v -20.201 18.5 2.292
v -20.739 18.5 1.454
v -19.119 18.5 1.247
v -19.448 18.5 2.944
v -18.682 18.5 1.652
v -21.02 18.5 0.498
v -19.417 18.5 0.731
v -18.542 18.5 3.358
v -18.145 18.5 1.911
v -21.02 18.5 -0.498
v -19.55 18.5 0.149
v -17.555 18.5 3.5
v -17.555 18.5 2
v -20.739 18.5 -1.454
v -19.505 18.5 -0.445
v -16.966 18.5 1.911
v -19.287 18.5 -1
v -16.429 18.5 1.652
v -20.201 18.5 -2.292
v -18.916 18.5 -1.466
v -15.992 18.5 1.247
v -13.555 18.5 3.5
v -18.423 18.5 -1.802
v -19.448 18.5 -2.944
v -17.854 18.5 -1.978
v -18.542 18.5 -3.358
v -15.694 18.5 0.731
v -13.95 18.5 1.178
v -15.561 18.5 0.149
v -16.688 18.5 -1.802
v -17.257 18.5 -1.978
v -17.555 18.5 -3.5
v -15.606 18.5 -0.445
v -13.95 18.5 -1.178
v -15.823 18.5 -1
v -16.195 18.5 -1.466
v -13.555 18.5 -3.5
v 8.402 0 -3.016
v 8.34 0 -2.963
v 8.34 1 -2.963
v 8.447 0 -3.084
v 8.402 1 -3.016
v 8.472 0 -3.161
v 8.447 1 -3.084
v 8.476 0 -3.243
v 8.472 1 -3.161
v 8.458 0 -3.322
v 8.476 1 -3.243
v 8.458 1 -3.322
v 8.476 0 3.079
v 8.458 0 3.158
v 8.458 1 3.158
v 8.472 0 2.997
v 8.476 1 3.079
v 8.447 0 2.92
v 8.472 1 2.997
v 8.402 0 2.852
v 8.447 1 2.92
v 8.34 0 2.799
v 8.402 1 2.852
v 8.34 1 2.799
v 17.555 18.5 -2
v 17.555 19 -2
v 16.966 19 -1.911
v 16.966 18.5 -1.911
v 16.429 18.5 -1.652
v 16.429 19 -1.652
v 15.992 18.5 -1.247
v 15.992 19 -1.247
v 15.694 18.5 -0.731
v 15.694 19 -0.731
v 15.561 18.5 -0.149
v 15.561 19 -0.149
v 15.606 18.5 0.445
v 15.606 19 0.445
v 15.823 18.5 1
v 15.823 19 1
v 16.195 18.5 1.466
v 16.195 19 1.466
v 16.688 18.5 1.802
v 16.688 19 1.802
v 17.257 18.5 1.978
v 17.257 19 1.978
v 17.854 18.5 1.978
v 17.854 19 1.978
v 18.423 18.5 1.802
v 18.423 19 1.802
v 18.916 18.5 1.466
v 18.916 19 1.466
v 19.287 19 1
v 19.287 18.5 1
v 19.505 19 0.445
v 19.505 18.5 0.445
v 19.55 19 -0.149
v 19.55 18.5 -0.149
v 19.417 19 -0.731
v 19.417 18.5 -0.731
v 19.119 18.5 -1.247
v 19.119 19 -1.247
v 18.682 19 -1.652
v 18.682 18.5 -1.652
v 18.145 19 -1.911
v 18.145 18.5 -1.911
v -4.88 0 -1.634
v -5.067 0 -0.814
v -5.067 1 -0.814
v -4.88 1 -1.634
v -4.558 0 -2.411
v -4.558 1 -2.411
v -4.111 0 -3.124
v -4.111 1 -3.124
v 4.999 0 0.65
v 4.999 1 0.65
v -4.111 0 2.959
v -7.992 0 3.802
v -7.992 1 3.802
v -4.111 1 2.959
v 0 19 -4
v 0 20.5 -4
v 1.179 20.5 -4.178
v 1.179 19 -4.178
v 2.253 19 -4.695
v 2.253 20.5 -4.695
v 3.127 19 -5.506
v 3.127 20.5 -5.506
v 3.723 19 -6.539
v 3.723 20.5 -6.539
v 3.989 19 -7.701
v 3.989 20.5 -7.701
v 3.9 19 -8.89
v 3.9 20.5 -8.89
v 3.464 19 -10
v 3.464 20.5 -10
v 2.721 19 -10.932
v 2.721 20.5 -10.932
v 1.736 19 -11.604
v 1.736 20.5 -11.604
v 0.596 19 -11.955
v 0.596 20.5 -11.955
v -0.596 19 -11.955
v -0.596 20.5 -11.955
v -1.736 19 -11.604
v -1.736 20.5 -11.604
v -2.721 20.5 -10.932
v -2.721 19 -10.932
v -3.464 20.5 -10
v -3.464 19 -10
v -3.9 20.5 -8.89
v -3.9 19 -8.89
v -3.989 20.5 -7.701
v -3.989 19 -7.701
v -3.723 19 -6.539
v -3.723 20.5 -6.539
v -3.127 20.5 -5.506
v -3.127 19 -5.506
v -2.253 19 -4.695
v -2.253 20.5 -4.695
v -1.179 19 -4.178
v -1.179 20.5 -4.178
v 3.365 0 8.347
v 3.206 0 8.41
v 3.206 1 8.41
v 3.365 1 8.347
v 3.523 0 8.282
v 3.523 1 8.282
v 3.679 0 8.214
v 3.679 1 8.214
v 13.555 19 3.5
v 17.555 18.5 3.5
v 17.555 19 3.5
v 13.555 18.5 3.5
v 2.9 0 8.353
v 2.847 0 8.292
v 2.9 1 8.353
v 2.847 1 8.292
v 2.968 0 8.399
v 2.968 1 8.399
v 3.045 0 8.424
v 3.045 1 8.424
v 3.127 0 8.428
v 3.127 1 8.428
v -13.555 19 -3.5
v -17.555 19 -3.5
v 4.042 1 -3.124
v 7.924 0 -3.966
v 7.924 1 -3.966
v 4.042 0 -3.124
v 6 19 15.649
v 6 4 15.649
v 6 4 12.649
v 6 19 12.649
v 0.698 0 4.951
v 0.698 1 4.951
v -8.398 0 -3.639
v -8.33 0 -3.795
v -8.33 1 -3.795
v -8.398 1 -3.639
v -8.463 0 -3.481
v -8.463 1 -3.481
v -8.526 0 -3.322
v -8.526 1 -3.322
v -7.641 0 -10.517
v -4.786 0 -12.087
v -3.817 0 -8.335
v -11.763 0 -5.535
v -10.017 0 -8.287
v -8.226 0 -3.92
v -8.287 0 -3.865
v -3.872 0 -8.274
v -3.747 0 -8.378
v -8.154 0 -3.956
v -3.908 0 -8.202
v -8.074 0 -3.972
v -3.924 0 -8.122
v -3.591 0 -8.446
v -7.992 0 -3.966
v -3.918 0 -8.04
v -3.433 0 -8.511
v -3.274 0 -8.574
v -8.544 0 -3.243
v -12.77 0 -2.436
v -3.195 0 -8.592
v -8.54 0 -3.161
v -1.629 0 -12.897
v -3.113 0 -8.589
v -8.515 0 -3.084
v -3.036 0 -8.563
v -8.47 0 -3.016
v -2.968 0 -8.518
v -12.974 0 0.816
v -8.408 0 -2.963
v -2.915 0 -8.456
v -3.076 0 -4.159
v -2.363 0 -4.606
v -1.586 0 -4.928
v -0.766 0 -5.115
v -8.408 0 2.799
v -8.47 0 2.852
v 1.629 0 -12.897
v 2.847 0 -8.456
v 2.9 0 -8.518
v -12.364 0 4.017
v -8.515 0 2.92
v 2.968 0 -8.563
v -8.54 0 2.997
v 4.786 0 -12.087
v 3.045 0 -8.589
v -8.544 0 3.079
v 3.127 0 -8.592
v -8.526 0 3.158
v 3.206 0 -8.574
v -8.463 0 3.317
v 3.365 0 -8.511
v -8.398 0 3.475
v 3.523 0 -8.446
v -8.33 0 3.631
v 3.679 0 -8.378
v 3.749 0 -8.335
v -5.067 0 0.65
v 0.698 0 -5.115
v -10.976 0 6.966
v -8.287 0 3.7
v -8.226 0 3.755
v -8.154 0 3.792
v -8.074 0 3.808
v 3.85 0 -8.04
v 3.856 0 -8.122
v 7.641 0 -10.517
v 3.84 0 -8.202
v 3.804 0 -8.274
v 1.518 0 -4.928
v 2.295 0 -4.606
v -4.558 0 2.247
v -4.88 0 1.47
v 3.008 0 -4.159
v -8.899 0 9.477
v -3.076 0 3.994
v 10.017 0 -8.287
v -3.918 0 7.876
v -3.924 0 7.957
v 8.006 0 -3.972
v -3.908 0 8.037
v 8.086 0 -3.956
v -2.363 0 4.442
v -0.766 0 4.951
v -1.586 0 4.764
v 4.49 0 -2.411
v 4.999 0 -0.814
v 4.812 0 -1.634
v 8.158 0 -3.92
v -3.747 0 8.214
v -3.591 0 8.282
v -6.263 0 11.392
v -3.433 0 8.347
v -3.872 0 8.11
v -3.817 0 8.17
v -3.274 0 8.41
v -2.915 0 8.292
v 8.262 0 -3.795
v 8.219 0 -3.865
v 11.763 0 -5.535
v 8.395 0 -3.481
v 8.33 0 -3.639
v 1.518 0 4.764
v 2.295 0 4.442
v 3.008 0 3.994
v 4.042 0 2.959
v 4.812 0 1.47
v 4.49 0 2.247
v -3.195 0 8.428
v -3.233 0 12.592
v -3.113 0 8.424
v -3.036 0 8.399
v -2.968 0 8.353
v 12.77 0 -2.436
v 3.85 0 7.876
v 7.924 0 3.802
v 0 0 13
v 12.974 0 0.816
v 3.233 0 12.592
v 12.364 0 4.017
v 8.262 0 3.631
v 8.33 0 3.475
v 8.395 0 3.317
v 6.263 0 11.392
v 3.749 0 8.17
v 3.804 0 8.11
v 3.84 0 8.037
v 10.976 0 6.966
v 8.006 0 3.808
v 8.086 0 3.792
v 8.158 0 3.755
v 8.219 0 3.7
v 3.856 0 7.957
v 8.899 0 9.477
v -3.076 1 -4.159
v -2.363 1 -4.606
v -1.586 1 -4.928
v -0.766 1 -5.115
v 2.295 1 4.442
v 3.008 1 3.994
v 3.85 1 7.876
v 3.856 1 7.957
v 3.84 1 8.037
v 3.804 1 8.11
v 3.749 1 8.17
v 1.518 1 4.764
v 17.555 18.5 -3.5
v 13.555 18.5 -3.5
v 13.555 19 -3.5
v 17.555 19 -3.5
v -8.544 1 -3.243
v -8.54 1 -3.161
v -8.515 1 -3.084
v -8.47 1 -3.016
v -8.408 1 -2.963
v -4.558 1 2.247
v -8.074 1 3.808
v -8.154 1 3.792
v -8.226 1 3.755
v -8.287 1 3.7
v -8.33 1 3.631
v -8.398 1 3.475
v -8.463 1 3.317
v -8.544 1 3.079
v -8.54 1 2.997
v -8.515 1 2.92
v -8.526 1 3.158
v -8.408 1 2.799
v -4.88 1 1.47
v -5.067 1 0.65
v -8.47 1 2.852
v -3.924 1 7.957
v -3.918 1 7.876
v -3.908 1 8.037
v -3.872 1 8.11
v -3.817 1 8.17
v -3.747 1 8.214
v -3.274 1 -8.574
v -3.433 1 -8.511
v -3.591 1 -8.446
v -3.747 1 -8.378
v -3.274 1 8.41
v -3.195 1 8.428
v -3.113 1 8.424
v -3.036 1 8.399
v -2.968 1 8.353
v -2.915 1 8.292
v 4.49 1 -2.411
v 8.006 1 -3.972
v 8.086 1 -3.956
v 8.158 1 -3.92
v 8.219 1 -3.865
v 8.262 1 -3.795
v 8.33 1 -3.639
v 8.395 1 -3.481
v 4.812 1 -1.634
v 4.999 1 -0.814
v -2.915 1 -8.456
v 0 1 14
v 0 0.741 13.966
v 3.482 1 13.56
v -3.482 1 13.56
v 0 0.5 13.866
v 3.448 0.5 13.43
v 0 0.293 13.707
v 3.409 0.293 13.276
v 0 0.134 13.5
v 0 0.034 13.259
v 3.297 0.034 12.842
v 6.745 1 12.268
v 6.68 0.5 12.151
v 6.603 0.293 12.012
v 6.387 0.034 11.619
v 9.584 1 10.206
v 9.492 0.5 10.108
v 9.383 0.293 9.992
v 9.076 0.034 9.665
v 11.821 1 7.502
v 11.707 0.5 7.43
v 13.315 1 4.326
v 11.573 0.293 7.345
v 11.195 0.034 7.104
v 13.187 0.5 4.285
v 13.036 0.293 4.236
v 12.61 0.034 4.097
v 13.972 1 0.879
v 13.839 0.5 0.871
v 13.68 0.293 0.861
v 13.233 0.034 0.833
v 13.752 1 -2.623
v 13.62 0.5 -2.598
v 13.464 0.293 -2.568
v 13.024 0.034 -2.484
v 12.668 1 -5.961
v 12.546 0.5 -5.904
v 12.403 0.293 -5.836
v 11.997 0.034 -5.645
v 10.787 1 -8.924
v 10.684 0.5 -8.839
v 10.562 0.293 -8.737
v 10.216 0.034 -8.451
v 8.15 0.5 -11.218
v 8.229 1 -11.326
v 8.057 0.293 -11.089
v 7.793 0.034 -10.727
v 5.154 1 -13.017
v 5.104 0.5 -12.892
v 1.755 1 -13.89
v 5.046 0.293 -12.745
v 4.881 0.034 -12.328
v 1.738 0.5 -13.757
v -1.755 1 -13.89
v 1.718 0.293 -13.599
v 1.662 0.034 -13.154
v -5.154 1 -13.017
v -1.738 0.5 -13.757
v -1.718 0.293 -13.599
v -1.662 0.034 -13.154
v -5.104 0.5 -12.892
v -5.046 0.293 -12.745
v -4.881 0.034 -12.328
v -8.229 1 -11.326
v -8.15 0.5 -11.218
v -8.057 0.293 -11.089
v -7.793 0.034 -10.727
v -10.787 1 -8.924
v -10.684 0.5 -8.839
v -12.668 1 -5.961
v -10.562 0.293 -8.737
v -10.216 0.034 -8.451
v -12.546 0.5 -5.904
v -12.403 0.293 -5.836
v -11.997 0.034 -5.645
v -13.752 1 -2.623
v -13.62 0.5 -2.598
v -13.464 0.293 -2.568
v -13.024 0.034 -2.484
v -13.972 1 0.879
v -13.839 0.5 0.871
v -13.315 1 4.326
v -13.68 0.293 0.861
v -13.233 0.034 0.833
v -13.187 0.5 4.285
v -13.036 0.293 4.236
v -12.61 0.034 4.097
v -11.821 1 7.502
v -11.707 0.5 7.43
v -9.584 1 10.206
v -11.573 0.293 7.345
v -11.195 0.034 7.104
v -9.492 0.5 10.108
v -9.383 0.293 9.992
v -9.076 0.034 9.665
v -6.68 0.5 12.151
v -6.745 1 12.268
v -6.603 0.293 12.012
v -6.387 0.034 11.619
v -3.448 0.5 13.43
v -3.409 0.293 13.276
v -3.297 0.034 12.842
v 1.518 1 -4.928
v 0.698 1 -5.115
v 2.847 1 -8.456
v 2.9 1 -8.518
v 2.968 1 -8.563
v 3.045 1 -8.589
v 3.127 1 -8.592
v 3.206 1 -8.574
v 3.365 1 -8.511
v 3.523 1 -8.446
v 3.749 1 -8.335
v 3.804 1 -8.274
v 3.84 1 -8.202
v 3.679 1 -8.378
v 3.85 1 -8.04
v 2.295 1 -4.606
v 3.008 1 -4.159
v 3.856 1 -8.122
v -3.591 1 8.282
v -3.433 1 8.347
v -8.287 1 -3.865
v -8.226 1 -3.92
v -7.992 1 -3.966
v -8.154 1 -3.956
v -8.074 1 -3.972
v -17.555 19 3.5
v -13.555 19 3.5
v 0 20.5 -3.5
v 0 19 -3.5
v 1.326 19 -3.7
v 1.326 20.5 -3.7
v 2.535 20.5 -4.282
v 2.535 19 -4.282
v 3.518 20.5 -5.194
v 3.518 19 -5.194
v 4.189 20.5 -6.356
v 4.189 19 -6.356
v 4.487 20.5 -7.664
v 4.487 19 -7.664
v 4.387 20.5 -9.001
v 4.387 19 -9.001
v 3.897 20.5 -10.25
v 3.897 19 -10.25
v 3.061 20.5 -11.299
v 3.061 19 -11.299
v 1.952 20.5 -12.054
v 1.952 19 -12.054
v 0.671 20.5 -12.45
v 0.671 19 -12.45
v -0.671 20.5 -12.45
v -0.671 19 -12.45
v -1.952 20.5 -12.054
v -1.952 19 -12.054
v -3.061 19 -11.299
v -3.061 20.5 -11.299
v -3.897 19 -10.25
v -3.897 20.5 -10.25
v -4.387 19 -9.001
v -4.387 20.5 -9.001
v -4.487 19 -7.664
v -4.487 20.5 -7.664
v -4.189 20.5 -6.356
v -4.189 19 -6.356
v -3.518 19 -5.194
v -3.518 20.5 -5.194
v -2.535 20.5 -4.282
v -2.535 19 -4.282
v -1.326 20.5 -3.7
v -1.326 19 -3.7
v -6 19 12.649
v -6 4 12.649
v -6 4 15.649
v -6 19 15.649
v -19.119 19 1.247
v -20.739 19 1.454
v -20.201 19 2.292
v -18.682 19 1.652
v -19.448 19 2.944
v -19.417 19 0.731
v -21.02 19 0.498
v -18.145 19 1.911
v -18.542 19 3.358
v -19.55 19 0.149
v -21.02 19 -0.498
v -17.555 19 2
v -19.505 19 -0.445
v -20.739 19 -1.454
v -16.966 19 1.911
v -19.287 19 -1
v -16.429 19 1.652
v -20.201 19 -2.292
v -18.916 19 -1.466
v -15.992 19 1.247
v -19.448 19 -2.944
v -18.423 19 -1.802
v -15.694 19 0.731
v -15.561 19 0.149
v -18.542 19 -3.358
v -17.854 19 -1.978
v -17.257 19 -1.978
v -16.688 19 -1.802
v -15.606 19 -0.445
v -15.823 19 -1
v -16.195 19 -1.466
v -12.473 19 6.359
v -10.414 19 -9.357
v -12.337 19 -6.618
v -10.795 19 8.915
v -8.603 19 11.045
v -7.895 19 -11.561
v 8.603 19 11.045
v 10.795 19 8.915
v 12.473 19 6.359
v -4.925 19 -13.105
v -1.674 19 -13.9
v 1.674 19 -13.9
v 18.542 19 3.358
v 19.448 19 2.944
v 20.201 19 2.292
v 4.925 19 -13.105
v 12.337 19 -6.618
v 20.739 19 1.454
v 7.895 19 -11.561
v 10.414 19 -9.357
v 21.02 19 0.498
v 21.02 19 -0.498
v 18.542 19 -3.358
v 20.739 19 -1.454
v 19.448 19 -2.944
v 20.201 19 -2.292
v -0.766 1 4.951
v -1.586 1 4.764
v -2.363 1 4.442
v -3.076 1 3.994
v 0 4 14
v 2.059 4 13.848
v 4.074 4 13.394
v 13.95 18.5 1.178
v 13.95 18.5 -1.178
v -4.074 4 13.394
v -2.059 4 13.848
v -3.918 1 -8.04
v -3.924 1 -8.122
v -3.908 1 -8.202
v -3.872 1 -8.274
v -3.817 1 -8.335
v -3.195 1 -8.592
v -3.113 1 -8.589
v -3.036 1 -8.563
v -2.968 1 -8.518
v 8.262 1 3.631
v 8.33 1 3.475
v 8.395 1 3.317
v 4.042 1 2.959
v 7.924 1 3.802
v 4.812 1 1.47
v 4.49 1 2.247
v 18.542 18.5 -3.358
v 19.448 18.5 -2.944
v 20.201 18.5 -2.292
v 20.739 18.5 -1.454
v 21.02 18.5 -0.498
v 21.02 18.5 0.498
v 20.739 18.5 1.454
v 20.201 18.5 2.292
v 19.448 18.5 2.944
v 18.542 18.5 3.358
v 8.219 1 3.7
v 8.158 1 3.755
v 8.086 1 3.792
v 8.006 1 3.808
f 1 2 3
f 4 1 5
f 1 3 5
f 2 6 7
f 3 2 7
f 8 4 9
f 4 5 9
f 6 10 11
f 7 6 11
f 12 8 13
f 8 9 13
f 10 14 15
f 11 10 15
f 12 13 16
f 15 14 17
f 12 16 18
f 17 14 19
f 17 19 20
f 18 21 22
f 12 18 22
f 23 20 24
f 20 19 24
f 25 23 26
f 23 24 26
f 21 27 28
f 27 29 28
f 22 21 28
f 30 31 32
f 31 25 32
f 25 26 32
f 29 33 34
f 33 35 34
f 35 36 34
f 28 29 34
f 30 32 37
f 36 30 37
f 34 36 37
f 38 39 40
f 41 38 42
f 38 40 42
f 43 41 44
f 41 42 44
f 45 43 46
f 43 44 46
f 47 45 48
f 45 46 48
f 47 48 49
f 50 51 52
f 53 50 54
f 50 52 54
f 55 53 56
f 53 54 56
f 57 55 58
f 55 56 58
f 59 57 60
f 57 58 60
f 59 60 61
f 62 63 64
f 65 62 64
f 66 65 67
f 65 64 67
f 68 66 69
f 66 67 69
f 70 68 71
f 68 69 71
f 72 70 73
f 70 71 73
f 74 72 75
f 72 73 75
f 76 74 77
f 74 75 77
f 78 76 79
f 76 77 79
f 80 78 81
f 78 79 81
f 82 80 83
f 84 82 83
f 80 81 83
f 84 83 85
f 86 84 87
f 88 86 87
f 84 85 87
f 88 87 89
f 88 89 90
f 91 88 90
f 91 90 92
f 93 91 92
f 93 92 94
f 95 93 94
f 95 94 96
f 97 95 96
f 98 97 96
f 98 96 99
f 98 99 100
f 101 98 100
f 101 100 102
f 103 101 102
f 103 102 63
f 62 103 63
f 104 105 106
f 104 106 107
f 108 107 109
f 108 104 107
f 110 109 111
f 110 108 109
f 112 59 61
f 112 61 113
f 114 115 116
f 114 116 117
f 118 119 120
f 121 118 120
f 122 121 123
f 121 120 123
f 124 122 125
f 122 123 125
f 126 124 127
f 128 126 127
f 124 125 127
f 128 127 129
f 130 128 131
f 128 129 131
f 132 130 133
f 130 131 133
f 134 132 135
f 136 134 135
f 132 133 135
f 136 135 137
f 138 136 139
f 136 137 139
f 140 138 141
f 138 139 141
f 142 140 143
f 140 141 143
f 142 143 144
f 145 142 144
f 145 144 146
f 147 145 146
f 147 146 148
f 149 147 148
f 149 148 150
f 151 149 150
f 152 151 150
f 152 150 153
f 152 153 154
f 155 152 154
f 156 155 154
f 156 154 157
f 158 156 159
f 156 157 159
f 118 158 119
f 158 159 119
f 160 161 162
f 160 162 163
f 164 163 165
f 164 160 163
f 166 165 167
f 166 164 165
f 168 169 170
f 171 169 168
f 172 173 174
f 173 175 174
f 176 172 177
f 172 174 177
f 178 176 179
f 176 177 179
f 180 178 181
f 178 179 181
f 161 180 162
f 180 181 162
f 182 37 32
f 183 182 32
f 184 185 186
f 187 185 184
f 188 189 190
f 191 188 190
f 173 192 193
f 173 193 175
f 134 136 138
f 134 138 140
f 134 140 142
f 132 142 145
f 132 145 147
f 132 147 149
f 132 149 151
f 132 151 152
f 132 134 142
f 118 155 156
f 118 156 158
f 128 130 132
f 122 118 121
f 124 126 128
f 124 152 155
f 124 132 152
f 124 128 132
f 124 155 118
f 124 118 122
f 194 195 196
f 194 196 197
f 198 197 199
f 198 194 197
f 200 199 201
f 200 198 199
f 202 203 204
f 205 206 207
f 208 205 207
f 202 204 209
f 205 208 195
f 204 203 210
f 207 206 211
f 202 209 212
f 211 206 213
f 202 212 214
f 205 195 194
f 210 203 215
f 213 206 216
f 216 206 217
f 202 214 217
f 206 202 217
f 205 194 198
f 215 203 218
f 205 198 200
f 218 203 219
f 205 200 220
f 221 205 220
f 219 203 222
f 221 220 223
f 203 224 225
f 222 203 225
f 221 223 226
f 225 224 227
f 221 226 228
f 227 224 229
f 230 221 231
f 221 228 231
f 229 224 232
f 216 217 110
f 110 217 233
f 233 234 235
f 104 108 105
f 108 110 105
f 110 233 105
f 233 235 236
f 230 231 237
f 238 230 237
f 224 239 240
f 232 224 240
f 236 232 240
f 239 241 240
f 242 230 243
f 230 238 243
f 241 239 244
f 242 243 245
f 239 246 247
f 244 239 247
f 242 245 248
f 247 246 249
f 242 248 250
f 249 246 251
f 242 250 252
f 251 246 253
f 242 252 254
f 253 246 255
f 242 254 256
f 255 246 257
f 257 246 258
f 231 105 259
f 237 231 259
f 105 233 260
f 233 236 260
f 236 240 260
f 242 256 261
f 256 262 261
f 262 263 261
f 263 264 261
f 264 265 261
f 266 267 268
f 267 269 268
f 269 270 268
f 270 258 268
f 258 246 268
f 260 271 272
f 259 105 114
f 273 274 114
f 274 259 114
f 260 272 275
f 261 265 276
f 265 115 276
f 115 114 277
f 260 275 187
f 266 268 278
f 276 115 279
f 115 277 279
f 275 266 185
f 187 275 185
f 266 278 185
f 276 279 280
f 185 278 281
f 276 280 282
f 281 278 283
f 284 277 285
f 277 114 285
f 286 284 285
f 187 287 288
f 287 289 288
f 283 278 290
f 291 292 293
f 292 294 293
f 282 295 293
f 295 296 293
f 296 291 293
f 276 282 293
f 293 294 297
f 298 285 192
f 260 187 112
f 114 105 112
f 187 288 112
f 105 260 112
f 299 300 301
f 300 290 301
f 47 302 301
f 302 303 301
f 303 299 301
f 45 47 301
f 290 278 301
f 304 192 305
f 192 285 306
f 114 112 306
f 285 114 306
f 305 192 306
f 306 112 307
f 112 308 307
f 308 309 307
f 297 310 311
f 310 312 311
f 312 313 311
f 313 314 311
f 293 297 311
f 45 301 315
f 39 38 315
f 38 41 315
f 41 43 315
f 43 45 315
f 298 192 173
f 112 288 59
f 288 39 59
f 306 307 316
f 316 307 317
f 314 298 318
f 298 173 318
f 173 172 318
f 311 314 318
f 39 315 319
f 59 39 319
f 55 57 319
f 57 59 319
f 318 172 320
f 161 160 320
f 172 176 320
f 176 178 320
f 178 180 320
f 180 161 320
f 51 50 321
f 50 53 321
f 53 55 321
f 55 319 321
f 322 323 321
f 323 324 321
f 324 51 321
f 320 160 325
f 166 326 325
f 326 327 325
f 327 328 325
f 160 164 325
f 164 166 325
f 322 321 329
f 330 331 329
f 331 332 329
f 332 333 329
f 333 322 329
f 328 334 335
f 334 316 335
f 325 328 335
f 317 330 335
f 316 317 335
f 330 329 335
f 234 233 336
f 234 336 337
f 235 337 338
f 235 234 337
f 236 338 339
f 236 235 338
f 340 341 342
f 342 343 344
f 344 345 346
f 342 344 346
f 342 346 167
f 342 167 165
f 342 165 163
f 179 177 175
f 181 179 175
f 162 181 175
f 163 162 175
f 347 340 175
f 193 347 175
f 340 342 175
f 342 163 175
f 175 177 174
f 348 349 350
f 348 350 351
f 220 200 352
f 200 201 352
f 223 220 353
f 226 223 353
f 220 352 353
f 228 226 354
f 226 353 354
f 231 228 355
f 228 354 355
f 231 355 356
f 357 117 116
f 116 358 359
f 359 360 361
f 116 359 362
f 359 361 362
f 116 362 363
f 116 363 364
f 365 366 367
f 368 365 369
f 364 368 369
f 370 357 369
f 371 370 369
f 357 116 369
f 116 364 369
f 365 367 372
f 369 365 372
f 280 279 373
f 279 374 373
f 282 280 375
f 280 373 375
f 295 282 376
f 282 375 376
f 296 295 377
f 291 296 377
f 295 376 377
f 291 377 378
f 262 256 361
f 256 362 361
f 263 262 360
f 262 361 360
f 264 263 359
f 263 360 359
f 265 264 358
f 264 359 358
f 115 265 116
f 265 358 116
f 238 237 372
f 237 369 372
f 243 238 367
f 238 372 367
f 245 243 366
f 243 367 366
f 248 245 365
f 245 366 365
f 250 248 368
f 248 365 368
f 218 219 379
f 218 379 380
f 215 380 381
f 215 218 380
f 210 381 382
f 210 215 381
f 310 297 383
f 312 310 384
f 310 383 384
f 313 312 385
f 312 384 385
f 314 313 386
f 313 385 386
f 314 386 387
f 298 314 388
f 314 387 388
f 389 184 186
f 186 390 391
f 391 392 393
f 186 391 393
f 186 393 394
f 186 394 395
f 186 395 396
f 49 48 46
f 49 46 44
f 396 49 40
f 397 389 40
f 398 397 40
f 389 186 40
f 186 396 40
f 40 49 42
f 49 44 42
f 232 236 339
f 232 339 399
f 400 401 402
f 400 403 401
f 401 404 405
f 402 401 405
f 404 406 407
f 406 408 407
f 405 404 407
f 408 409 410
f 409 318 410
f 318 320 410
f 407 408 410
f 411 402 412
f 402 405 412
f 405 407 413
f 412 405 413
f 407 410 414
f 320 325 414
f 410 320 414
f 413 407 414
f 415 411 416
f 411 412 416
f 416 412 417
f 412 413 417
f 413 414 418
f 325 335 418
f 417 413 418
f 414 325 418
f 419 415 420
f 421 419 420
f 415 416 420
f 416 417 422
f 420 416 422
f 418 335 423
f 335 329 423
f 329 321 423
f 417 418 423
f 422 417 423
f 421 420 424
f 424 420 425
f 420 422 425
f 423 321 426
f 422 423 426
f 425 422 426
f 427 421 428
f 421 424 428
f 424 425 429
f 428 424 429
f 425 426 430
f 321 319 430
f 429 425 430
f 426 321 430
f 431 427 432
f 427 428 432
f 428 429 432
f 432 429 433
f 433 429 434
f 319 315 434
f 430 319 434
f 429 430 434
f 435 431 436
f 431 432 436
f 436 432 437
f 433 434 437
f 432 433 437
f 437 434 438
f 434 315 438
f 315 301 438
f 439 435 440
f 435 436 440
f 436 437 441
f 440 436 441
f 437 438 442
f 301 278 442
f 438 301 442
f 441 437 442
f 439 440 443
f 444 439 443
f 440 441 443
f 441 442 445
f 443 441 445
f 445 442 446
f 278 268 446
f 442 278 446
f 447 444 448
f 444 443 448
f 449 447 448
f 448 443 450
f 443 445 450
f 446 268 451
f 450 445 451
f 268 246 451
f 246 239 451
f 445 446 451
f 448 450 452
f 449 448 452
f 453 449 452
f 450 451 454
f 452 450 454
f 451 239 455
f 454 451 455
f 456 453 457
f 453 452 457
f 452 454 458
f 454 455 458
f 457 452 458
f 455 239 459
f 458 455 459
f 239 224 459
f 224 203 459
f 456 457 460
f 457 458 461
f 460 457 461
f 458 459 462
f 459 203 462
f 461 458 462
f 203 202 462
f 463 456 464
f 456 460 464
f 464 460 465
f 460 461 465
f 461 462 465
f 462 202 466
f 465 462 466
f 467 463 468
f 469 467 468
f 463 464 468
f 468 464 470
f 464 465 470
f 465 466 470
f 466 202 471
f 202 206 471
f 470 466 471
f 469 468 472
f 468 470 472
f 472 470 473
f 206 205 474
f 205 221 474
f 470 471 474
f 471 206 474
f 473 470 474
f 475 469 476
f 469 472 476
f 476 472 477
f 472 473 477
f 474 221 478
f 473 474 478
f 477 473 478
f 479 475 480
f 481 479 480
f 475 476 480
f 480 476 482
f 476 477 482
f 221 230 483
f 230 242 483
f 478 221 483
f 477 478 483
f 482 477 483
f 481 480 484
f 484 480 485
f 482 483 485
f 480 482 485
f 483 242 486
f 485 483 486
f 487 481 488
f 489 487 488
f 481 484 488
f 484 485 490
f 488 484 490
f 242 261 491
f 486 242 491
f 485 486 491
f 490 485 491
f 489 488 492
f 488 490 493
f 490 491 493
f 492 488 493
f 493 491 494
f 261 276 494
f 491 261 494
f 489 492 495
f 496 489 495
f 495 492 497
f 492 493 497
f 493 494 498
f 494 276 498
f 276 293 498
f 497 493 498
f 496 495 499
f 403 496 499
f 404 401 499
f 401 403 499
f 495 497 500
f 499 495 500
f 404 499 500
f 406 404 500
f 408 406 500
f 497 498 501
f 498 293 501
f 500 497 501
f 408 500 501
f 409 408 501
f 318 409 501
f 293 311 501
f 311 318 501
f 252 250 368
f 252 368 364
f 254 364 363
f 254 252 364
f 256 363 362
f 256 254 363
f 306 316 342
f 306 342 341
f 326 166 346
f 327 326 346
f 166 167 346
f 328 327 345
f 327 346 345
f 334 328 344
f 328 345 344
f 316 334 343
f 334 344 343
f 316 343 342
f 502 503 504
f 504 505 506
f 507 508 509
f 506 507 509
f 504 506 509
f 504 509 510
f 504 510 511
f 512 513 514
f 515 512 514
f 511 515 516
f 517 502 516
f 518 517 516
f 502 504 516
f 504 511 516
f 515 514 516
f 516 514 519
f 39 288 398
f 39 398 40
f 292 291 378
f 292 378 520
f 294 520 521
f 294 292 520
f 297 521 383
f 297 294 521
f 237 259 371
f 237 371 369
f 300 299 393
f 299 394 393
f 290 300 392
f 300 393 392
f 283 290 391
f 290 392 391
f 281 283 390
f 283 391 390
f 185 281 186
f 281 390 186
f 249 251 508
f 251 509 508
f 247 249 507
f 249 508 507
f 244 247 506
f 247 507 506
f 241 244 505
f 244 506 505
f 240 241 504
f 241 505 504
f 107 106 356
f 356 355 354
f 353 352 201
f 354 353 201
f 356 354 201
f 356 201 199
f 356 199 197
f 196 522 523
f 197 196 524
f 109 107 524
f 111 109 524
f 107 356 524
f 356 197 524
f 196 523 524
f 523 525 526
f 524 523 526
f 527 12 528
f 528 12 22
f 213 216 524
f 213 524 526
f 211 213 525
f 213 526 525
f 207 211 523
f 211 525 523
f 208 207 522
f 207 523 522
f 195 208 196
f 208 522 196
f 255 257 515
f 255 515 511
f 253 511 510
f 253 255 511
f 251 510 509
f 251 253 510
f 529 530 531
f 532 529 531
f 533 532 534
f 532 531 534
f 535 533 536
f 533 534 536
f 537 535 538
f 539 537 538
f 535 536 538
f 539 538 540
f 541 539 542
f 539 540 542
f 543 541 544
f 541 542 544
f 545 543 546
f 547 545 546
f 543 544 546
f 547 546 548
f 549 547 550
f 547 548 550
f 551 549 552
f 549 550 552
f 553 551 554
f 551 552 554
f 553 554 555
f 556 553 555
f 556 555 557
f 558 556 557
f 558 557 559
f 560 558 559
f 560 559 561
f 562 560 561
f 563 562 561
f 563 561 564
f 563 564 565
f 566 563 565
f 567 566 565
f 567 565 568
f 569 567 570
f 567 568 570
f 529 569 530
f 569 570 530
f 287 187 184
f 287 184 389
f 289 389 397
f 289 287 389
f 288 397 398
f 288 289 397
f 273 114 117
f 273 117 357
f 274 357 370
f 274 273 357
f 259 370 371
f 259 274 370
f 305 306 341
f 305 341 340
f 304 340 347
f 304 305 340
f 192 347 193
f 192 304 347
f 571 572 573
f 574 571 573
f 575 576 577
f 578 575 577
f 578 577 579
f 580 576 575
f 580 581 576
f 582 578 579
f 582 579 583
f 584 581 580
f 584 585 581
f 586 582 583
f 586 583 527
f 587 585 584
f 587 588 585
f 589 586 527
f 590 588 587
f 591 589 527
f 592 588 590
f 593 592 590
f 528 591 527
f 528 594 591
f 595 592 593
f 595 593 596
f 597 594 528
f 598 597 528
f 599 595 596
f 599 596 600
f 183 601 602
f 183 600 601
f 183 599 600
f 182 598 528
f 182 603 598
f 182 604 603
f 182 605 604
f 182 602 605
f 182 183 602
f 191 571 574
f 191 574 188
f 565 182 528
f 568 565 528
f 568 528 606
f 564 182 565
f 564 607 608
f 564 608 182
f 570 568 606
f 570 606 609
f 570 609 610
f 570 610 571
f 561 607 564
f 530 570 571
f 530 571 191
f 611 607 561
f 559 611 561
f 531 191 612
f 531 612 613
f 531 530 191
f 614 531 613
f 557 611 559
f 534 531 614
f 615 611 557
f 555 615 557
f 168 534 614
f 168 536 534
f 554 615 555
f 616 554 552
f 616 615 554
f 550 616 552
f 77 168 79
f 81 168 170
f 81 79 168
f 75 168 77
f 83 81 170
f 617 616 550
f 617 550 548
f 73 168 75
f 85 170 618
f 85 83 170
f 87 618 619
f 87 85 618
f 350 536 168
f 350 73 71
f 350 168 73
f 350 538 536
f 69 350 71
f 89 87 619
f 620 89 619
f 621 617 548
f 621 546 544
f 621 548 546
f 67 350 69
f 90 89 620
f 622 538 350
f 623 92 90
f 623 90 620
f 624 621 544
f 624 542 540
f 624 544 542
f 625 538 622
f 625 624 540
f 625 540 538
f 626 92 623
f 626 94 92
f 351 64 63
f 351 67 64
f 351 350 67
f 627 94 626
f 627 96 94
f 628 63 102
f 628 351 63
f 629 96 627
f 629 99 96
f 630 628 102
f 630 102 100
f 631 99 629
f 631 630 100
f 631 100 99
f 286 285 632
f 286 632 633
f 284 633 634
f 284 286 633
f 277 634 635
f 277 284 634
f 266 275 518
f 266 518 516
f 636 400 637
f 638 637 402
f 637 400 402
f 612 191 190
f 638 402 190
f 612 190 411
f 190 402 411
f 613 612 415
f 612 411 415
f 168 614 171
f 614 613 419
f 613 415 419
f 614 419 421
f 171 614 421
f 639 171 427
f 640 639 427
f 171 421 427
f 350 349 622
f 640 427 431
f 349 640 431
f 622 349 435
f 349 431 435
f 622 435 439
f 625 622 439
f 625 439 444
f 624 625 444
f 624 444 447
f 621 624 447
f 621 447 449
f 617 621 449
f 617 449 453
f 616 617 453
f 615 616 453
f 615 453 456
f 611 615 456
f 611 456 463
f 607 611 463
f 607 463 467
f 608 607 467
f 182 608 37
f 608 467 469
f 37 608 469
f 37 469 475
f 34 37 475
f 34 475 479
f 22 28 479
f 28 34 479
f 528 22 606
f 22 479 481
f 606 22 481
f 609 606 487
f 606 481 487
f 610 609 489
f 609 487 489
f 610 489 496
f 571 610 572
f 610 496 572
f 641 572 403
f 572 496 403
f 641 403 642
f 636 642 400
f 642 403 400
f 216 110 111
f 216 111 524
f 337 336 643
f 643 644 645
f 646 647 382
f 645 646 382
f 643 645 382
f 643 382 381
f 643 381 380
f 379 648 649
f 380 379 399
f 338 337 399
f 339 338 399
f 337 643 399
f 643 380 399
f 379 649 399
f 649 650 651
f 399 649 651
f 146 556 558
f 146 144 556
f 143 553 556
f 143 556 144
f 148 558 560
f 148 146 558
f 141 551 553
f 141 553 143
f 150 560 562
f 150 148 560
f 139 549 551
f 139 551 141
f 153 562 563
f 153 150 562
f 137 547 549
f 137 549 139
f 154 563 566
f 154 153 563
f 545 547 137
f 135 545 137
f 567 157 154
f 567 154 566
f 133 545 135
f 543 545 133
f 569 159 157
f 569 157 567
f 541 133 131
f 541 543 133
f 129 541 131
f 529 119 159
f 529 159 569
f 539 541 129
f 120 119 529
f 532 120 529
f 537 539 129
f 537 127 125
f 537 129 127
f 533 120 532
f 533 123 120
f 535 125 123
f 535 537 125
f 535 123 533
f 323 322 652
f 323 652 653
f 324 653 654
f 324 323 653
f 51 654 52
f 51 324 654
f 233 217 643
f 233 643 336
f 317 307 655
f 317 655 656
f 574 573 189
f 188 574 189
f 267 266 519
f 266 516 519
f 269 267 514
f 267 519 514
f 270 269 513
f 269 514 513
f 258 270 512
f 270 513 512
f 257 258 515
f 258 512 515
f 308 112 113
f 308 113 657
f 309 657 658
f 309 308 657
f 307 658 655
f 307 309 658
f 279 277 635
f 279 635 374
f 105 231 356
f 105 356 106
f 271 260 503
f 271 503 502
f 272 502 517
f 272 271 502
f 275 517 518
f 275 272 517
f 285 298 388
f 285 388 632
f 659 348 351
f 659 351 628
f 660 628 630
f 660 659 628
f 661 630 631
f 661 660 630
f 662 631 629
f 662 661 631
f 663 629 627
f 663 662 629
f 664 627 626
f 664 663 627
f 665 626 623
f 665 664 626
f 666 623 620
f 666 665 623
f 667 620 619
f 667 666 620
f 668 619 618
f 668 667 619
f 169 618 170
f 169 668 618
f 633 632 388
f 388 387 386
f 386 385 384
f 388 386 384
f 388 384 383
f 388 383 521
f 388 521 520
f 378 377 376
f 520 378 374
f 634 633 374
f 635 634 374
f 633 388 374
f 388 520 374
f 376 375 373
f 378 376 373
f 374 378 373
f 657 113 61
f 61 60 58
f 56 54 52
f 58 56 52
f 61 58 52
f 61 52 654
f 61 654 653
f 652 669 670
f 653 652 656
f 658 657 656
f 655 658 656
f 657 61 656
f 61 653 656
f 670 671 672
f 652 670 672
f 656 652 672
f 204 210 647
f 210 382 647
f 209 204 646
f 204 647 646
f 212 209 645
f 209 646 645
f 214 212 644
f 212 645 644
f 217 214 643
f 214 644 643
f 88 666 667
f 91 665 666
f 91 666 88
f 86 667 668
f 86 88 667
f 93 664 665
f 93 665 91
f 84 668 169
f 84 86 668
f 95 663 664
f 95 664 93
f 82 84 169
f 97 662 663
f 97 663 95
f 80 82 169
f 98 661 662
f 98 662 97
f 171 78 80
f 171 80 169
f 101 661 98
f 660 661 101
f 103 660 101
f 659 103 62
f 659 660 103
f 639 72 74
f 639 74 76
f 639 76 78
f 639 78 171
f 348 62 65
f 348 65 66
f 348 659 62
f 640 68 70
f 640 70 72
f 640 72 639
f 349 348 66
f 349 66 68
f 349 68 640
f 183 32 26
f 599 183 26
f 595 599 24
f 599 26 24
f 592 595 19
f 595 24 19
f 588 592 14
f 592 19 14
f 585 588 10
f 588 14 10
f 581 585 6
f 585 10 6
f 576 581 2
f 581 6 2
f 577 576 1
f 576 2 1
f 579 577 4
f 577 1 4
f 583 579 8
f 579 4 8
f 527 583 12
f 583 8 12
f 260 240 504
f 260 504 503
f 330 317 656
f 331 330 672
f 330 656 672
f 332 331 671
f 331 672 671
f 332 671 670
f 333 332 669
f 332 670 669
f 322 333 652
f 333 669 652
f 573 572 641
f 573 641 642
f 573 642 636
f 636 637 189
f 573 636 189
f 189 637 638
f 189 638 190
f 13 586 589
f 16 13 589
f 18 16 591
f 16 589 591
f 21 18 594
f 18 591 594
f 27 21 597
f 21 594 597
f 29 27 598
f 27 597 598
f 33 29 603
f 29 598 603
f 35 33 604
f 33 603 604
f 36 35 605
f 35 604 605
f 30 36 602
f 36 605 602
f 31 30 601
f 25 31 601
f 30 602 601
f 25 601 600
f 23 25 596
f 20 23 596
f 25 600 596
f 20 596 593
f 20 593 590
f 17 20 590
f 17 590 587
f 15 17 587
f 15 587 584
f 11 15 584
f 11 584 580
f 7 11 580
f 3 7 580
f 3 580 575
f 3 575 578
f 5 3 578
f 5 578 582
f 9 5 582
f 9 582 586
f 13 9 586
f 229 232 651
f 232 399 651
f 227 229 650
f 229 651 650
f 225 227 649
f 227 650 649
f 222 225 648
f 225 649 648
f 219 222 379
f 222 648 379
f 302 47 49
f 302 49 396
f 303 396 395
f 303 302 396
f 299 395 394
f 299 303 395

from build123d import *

# Parameters (mm, degrees)
SKETCH_1_R                       = 14
EXTRUDE_1_DEPTH                  = 19
SKETCH_2_R                       = 4.5
EXTRUDE_2_DEPTH                  = 1.5
SKETCH_3_R                       = 4
CUT_EXTRUDE_1_DEPTH              = 1.5
EXTRUDE_START                    = -0.5
EXTRUDE_3_DEPTH                  = 0.5
SKETCH_5_R                       = 2
CUT_EXTRUDE_2_DEPTH              = 32.628019629
EXTRUDE_START_2                  = -15
EXTRUDE_4_DEPTH                  = 15
FILLET_1_R                       = 1
CUT_EXTRUDE_3_DEPTH              = 1
FILLET_2_R                       = 0.3
PATTERN_CIRCULAR_1_COUNT         = 8
FILLET_2_OF_PATTERN_CIRCULAR_1_R = 0.3


with BuildPart() as part:
    # 草图1 → 凸台-拉伸1 (new body)
    with BuildSketch(Plane(origin=(0, 0, 0), x_dir=(1, 0, 0), z_dir=(0, 1, 0))):
        with Locations(Location((0, 0, 0), (0, 0, 270))):
            Circle(SKETCH_1_R)
    extrude(amount=EXTRUDE_1_DEPTH)

    # 草图2 → 凸台-拉伸2 (add)
    with BuildSketch(Plane(origin=(0, 19, 0), x_dir=(1, 0, 0), z_dir=(0, 1, 0))):
        with Locations(Location((0, 8, 0), (0, 0, 270))):
            Circle(SKETCH_2_R)
    extrude(amount=EXTRUDE_2_DEPTH)

    # 草图3 → 切除-拉伸1 (cut)
    with BuildSketch(Plane(origin=(0, 20.5, 0), x_dir=(1, 0, 0), z_dir=(0, 1, 0))):
        with Locations(Location((0, 8, 0), (0, 0, 270))):
            Circle(SKETCH_3_R)
    extrude(amount=-CUT_EXTRUDE_1_DEPTH, mode=Mode.SUBTRACT)

    # 草图4 → 凸台-拉伸3 (add)
    with BuildSketch(Plane(origin=(0, 19, 0), x_dir=(1, 0, 0), z_dir=(0, 1, 0)).offset(EXTRUDE_START)):
        with BuildLine():
            Line((-13.555441712, 3.5), (-17.555441712, 3.5))
            ThreePointArc((-17.555441712, 3.5), (-21.055441712, 0), (-17.555441712, -3.5))
            Line((-17.555441712, -3.5), (-13.555441712, -3.5))
            ThreePointArc((-13.555441712, -3.5), (-14, 0), (-13.555441712, 3.5))
        make_face()
        with BuildLine():
            Line((13.555441712, 3.5), (17.555441712, 3.5))
            ThreePointArc((17.555441712, 3.5), (21.055441712, 0), (17.555441712, -3.5))
            Line((17.555441712, -3.5), (13.555441712, -3.5))
            ThreePointArc((13.555441712, -3.5), (14, 0), (13.555441712, 3.5))
        make_face()
    extrude(amount=EXTRUDE_3_DEPTH)

    # 草图5 → 切除-拉伸2 (cut, through all)
    with BuildSketch(Plane(origin=(0, 19, 0), x_dir=(1, 0, 0), z_dir=(0, 1, 0))):
        with Locations(Location((-17.555441712, 0, 0), (0, 0, 270))):
            Circle(SKETCH_5_R)
        with Locations(Location((17.555441712, 0, 0), (0, 0, 90))):
            Circle(SKETCH_5_R)
    extrude(amount=-CUT_EXTRUDE_2_DEPTH, mode=Mode.SUBTRACT)

    # 草图6 → 凸台-拉伸4 (add)
    with BuildSketch(Plane(origin=(0, 19, 0), x_dir=(1, 0, 0), z_dir=(0, 1, 0)).offset(EXTRUDE_START_2)):
        with BuildLine():
            Line((-6, -12.649110641), (-6, -15.649110641))
            Line((-6, -15.649110641), (6, -15.649110641))
            Line((6, -15.649110641), (6, -12.649110641))
            ThreePointArc((6, -12.649110641), (0, -14), (-6, -12.649110641))
        make_face()
    extrude(amount=EXTRUDE_4_DEPTH)

    # 圆角1
    fillet_1_edges = [part.edges().sort_by_distance(p)[0] for p in [
        (0, 0, -14),
    ]]
    fillet(fillet_1_edges, radius=FILLET_1_R)

    # 草图7 → 切除-拉伸3 (cut)
    with BuildSketch(Plane.XZ):
        with BuildLine():
            Line((0.697808785, 4.951066845), (2.97689197, 8.493415932))
            ThreePointArc((2.97689197, 8.493415932), (3.444150891, 8.314915793), (3.900771502, 8.1107325))
            Line((3.900771502, 8.1107325), (3.007507616, 3.994358264))
            ThreePointArc((3.007507616, 3.994358264), (1.913417162, 4.619397663), (0.697808785, 4.951066845))
        make_face()
    cut_extrude_3 = extrude(amount=-CUT_EXTRUDE_3_DEPTH, mode=Mode.SUBTRACT)

    # 圆角2
    fillet_2_edges = [part.edges().sort_by_distance(p)[0] for p in [
        (2.97689197, 0.5, 8.493415932),
        (3.900771502, 0.5, 8.1107325),
    ]]
    fillet(fillet_2_edges, radius=FILLET_2_R)

    # 阵列(圆周)1: 切除-拉伸3 ×8 about axis
    pattern_circular_1_axis = Axis((-0.034019588, 0, -0.082130551), (0, 1, 0))
    for i in range(1, PATTERN_CIRCULAR_1_COUNT):
        add(cut_extrude_3.rotate(pattern_circular_1_axis, i * 360 / PATTERN_CIRCULAR_1_COUNT), mode=Mode.SUBTRACT)

    # 圆角2 of 阵列(圆周)1
    fillet_2_of_pattern_circular_1_edges = [part.edges().sort_by_distance(p)[0] for p in [
        (8.158843463, 0.5, 3.85266054),
        (8.541526895, 0.5, 2.928781007),
        (8.541526895, 0.5, -3.093042109),
        (8.158843463, 0.5, -4.016921641),
        (3.900771502, 0.5, -8.274993601),
        (2.97689197, 0.5, -8.657677034),
        (-3.044931146, 0.5, -8.657677034),
        (-3.968810678, 0.5, -8.274993601),
        (-8.226882639, 0.5, -4.016921641),
        (-8.609566071, 0.5, -3.093042109),
        (-8.609566071, 0.5, 2.928781007),
        (-8.226882639, 0.5, 3.85266054),
        (-3.968810678, 0.5, 8.1107325),
        (-3.044931146, 0.5, 8.493415932),
    ]]
    fillet(fillet_2_of_pattern_circular_1_edges, radius=FILLET_2_OF_PATTERN_CIRCULAR_1_R)


solid = part.part
